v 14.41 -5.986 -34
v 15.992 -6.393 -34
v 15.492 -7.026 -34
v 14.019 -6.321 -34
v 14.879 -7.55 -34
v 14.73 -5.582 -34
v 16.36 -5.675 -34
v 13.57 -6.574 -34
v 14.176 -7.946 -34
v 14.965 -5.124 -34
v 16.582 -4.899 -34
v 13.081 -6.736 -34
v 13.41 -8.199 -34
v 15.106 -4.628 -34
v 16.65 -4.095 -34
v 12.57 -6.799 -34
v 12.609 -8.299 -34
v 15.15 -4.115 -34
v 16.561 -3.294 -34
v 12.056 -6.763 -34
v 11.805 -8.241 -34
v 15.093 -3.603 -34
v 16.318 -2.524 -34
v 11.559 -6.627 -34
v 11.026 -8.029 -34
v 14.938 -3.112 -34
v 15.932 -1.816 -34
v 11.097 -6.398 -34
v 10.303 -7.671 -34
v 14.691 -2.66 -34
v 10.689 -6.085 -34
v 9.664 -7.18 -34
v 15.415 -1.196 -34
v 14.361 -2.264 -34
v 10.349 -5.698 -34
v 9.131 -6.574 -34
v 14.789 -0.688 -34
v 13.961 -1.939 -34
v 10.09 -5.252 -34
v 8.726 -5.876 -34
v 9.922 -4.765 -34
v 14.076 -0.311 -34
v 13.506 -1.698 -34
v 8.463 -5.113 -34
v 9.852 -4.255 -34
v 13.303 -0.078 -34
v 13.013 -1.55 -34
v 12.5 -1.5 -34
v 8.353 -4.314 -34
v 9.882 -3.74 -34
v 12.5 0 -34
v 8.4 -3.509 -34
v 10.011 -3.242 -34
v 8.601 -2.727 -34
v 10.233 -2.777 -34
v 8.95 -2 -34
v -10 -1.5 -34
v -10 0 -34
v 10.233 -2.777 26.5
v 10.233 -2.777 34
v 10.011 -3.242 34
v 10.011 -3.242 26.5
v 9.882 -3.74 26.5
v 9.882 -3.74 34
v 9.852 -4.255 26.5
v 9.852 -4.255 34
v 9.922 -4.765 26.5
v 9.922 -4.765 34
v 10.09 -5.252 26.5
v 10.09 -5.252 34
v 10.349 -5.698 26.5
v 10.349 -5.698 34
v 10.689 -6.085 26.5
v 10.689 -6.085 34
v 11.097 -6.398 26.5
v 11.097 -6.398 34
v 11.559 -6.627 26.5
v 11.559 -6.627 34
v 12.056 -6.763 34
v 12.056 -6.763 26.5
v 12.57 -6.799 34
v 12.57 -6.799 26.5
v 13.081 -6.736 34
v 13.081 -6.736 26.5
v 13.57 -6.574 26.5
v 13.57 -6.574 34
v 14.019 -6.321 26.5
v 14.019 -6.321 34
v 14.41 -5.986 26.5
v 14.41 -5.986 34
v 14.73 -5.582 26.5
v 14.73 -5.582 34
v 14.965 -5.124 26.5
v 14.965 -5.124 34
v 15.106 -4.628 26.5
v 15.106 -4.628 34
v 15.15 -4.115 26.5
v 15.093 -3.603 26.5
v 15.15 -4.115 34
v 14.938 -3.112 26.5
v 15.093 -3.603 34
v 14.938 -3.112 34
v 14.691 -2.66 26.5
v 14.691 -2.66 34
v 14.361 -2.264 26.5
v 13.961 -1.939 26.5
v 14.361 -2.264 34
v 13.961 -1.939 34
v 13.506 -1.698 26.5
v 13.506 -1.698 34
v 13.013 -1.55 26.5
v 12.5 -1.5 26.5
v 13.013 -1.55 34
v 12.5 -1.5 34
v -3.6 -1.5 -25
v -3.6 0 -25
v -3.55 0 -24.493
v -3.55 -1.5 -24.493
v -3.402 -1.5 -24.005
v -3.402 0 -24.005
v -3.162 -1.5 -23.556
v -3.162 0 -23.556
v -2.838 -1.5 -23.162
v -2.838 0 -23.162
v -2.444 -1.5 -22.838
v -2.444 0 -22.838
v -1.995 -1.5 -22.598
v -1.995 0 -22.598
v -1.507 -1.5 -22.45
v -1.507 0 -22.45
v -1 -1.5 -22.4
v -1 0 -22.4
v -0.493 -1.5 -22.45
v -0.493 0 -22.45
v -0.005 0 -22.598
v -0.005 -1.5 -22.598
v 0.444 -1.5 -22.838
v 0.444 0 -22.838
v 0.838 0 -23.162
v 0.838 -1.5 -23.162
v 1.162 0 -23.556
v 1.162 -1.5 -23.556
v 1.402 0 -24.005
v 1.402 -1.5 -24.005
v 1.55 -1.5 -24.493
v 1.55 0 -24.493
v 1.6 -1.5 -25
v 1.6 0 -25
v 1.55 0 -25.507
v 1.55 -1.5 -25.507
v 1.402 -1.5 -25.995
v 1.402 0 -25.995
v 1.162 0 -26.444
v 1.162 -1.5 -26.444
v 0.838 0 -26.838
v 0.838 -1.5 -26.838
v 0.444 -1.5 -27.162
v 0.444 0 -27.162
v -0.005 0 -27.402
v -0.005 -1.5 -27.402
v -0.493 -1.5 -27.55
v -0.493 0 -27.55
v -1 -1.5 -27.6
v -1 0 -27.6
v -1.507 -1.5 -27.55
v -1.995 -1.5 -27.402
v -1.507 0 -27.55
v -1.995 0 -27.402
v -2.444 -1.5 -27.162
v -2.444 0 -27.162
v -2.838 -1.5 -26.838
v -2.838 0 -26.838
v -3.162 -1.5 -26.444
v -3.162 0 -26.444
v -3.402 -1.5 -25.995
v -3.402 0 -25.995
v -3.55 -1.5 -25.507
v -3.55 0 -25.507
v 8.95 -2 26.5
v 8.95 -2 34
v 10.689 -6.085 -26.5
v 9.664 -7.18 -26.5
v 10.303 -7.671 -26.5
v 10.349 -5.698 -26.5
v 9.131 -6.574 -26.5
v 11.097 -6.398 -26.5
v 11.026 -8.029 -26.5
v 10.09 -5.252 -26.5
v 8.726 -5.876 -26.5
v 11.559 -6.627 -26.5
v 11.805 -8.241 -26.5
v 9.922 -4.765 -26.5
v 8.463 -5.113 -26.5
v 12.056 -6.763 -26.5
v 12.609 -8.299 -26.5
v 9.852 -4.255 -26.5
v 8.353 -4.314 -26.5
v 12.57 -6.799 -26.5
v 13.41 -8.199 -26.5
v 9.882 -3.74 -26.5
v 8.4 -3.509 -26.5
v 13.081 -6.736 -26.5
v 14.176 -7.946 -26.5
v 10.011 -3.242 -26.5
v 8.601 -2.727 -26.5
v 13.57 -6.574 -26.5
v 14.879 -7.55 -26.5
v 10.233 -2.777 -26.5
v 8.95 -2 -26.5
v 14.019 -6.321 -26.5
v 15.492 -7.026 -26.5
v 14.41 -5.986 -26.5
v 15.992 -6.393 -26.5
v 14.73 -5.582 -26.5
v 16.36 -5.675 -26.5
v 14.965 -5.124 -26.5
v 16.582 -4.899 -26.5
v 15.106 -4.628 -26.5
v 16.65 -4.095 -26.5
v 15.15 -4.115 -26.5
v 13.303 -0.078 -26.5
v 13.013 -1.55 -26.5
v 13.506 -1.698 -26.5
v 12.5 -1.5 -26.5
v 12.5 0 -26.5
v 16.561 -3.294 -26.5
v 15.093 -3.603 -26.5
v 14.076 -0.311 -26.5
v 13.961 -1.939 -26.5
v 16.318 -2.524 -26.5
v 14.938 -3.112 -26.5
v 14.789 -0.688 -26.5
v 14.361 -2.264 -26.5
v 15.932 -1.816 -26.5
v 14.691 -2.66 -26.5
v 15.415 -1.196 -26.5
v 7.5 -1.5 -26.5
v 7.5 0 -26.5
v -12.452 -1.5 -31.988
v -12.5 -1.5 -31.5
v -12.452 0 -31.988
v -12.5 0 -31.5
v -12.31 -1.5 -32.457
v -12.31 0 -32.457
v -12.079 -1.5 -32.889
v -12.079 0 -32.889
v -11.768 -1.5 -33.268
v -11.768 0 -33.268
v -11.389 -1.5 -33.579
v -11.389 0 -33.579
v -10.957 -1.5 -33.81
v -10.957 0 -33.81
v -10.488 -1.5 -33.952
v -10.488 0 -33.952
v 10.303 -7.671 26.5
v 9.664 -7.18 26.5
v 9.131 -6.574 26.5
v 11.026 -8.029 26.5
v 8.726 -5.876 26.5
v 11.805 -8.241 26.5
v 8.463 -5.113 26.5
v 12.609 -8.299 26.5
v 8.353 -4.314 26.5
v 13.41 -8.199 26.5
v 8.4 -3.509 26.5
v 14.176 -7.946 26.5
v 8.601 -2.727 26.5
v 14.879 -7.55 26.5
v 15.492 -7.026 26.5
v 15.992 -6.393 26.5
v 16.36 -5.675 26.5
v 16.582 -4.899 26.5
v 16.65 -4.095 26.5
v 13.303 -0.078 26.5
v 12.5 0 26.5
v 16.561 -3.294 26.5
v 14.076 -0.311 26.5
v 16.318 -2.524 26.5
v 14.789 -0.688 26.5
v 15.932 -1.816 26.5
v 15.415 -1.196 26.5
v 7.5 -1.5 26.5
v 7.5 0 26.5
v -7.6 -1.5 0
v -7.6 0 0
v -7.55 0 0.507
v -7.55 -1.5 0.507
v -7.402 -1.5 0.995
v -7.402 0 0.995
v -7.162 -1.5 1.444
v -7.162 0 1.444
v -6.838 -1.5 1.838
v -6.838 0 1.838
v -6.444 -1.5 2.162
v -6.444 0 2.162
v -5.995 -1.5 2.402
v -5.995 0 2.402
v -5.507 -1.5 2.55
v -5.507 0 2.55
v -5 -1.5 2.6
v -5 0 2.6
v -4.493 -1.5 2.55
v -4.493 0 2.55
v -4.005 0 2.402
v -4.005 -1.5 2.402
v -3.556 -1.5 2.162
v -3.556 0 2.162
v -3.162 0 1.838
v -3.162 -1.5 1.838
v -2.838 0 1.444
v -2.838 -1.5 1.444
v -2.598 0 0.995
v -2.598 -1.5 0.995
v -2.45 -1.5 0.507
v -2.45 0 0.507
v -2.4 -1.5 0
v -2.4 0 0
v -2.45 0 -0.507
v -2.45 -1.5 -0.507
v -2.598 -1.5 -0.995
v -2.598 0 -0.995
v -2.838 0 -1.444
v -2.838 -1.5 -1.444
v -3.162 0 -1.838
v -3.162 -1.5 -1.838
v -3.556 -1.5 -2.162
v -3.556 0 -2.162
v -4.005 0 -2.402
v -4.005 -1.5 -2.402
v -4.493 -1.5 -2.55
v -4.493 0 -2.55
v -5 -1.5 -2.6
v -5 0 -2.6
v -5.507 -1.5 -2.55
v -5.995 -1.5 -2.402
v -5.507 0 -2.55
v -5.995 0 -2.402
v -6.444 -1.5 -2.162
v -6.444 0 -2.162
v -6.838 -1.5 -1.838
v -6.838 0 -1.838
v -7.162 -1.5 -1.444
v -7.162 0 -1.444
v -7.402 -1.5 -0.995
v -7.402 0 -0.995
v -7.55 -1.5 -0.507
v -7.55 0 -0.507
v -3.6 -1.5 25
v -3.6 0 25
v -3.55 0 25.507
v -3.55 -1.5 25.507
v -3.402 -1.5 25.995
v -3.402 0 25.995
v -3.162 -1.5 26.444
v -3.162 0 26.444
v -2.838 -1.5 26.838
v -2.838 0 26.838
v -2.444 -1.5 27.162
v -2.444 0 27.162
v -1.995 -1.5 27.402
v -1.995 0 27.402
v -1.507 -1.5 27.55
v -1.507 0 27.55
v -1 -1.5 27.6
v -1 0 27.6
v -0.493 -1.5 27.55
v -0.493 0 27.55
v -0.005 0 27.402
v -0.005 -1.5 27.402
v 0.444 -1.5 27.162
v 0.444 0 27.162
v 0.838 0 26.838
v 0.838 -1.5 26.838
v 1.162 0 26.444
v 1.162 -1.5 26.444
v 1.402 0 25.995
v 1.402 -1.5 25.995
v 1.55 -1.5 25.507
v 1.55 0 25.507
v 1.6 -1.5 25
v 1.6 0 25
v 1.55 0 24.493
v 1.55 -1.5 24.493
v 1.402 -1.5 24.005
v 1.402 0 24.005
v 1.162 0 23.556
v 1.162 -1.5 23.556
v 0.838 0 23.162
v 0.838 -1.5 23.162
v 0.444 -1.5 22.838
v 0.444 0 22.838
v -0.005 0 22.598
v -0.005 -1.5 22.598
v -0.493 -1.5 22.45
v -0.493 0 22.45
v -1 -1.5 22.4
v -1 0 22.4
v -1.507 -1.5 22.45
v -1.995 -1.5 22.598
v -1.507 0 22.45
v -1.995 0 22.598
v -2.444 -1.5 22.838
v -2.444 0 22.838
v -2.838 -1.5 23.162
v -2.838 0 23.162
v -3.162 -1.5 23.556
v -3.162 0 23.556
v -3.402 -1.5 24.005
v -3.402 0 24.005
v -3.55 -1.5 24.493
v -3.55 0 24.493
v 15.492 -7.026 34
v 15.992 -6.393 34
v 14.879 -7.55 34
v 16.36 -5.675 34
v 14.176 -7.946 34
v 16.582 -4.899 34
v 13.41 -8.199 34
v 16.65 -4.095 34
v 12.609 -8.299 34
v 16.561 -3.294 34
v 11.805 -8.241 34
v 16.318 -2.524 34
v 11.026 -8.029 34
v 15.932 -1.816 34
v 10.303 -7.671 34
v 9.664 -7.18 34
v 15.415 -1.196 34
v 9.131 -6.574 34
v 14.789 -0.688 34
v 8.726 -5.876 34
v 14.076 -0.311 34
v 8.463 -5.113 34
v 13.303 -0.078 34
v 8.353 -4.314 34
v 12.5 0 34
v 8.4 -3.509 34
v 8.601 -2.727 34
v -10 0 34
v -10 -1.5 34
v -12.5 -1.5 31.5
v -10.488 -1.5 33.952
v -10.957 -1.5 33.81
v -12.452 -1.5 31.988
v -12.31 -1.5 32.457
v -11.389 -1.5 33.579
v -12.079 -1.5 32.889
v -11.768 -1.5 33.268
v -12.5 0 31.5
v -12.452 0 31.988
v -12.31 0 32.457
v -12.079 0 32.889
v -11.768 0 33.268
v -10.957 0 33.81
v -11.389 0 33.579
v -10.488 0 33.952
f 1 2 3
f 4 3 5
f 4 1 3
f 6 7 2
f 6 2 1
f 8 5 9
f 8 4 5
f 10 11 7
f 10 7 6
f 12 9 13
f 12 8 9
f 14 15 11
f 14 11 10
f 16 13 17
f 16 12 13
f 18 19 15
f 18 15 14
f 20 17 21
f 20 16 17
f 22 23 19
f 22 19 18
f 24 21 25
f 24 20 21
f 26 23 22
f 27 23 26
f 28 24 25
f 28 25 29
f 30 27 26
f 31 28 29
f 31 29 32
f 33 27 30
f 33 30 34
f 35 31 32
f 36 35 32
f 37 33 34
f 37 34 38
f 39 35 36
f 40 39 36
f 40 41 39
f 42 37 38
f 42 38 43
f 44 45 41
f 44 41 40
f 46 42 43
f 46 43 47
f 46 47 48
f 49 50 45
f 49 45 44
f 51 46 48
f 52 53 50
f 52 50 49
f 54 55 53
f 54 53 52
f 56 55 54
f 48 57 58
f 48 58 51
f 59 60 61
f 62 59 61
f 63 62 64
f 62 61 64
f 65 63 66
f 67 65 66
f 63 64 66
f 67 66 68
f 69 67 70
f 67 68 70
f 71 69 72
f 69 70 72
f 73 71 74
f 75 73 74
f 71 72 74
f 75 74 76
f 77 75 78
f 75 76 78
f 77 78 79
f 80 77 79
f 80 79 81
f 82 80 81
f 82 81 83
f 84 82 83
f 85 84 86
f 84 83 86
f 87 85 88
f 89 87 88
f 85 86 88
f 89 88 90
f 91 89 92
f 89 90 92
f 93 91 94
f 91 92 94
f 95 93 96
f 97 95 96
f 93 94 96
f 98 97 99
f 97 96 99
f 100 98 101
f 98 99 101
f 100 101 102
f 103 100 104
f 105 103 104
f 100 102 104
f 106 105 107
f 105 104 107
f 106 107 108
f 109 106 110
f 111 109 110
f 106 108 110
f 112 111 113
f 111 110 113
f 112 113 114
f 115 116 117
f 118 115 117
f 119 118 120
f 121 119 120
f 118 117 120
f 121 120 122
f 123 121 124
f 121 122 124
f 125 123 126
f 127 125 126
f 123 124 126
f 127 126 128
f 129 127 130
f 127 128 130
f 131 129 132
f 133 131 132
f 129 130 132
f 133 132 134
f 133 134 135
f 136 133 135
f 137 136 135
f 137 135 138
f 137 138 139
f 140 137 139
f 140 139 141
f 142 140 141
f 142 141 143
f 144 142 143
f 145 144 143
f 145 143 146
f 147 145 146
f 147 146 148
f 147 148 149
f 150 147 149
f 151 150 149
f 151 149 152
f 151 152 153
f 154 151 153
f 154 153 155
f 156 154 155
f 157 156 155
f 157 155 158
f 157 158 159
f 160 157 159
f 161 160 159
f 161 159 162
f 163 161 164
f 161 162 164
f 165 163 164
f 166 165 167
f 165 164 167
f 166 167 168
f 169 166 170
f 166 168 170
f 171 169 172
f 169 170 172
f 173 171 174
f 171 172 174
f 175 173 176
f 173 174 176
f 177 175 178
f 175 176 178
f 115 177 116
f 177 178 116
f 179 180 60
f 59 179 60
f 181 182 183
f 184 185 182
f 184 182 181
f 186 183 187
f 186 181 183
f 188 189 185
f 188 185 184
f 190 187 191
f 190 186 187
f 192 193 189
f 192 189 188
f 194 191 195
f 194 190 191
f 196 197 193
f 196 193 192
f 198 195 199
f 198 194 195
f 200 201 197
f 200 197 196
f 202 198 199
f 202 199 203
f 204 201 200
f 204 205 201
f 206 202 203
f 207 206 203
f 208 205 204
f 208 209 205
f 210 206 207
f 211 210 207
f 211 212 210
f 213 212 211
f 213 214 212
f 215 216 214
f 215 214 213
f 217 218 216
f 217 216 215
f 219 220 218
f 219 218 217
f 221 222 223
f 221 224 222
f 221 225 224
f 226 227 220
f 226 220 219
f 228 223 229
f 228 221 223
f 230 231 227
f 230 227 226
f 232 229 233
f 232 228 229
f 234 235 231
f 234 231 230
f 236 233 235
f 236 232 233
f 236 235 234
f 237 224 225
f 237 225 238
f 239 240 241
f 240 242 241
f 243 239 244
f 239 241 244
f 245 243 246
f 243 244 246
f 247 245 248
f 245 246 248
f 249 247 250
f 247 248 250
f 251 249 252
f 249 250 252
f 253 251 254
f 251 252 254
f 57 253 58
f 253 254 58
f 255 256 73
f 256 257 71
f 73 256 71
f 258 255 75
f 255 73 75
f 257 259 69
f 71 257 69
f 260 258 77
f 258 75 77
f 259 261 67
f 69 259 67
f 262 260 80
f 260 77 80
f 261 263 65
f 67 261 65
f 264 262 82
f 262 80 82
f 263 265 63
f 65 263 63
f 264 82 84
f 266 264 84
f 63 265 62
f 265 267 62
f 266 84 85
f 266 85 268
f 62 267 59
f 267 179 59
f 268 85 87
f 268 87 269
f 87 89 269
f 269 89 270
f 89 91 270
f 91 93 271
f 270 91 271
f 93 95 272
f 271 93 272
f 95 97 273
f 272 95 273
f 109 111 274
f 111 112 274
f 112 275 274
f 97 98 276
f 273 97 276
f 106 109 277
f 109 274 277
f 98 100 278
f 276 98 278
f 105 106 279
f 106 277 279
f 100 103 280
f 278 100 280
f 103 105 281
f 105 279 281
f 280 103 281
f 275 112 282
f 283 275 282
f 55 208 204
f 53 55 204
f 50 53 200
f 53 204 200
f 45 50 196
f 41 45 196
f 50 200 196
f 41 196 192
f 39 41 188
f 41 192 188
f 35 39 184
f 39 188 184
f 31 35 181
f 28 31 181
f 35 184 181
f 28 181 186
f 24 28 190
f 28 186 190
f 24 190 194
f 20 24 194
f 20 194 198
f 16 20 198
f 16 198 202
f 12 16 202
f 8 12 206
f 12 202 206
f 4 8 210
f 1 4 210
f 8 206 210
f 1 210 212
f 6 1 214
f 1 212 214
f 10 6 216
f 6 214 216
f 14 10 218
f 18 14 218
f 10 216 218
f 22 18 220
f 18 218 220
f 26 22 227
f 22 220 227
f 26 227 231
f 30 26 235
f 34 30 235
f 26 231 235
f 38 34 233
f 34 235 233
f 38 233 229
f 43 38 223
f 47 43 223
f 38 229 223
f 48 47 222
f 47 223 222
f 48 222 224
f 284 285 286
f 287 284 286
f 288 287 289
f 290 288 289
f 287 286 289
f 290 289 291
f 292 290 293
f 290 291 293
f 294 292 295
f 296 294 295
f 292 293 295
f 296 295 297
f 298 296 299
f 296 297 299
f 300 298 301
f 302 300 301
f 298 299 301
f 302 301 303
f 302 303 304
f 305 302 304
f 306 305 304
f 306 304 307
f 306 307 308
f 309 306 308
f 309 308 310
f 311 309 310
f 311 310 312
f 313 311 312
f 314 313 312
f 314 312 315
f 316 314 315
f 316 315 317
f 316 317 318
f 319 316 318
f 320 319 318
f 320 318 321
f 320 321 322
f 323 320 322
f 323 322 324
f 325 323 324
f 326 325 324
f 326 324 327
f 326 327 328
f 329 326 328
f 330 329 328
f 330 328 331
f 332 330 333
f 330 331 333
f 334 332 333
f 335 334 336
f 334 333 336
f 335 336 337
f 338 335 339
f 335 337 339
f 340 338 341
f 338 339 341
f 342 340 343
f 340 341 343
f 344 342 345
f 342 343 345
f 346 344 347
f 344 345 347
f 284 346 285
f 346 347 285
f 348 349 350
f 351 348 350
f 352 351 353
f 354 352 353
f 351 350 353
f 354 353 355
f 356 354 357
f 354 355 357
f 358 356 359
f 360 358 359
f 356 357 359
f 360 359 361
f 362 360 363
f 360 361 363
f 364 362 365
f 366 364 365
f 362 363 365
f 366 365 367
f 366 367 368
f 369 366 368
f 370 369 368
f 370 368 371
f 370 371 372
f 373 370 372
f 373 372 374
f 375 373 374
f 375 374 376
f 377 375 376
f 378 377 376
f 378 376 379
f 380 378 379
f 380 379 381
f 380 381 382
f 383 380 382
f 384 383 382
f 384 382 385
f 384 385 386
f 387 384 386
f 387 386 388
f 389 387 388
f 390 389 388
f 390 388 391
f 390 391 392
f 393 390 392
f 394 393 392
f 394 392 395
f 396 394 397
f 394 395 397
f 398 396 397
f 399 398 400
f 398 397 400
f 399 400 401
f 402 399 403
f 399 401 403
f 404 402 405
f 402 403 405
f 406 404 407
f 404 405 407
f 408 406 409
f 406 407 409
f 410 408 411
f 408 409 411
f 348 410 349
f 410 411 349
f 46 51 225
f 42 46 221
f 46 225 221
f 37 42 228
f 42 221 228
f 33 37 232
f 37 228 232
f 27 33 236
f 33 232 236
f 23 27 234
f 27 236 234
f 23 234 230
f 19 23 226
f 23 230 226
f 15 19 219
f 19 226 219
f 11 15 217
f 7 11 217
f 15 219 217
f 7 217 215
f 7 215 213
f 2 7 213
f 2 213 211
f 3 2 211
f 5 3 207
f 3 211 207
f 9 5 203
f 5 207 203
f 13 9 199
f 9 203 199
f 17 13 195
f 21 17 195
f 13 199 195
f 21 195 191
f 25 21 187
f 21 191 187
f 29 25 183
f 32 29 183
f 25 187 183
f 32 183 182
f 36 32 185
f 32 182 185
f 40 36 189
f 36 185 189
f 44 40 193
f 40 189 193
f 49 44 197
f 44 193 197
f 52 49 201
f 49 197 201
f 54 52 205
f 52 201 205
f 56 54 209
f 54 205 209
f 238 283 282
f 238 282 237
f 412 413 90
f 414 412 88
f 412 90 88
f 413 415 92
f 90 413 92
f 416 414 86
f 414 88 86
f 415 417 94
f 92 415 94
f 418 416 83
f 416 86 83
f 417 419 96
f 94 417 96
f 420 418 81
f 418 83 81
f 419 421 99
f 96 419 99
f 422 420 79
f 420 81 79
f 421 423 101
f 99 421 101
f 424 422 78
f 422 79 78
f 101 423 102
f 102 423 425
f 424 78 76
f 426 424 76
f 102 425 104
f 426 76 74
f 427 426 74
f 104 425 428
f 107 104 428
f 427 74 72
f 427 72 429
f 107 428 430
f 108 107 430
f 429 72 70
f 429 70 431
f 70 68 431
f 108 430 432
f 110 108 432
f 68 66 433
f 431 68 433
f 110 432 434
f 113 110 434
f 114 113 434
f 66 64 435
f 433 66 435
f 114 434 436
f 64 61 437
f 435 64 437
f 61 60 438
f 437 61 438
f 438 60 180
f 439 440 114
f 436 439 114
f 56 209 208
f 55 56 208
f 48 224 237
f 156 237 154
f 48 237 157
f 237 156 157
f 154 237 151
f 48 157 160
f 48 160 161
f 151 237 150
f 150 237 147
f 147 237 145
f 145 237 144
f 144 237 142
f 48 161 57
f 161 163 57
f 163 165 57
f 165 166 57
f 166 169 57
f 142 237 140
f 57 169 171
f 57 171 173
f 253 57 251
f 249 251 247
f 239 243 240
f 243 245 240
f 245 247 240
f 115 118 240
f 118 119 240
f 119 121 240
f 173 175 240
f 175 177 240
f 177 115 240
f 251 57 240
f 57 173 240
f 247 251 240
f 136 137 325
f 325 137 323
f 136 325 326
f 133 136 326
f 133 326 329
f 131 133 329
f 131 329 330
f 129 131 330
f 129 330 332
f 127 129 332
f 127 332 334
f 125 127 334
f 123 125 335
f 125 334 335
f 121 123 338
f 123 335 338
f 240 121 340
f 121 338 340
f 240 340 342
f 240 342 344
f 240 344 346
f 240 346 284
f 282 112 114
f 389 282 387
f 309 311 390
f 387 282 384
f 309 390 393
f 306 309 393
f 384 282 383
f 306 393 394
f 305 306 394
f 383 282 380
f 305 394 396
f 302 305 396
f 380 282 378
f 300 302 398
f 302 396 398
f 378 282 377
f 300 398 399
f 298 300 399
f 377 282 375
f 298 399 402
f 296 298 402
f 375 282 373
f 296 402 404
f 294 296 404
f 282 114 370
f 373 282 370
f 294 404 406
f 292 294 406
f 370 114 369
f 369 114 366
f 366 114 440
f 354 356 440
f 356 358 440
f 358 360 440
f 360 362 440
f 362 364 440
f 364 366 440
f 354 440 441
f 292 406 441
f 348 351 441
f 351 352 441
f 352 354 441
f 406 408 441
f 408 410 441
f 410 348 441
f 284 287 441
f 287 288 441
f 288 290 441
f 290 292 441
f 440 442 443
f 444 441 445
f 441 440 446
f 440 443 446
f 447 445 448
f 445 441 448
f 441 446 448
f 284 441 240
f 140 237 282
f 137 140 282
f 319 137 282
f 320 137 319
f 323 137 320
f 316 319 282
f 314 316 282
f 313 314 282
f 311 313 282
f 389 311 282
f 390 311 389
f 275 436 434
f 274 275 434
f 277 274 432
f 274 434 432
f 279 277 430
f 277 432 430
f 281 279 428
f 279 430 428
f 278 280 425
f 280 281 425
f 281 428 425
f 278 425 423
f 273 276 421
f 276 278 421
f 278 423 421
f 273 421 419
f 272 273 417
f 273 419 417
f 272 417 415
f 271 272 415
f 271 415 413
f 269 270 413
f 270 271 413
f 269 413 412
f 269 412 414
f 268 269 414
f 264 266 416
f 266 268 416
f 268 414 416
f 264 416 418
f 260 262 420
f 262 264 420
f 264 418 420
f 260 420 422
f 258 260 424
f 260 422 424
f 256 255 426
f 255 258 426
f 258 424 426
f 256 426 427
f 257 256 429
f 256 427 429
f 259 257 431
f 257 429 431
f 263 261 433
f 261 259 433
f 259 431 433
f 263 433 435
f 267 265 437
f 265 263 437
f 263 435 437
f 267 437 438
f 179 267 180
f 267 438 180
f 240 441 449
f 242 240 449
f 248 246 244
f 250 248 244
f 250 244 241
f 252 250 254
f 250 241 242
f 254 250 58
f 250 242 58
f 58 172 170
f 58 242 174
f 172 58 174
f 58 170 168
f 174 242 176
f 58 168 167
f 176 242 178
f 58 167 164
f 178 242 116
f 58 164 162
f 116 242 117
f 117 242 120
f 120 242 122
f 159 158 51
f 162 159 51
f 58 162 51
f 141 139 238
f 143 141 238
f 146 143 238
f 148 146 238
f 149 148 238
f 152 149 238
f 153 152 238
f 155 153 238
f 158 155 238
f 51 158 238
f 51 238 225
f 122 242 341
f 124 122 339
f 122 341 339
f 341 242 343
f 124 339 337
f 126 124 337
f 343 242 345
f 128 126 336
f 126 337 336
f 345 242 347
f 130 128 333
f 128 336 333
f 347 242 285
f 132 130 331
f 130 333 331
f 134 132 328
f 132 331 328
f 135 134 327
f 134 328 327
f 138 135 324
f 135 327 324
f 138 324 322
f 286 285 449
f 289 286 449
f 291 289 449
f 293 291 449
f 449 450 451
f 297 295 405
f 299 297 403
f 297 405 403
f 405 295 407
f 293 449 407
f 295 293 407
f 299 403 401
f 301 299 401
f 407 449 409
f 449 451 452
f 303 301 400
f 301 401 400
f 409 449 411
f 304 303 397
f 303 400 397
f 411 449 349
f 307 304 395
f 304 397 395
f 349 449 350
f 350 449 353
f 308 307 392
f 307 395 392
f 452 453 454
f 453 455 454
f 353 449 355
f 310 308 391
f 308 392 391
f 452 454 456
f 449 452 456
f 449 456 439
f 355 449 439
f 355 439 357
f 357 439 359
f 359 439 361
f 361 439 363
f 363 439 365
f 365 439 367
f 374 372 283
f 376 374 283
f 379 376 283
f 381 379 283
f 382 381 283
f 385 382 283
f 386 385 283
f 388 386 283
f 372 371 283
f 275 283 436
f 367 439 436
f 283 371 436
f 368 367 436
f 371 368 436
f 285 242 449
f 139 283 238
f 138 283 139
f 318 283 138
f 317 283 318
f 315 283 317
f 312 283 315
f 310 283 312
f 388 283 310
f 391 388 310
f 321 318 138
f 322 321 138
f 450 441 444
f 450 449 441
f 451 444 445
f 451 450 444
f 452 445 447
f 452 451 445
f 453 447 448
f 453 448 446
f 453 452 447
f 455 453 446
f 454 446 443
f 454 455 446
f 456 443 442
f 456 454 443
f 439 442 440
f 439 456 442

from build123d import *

# Parameters (mm, degrees)
TABAN_FLAN_1_DEPTH    = 34
IZIM9_W               = 9.15
IZIM9_H               = 53
KES_EKSTR_ZYON1_DEPTH = 39.757096124
IZIM11_R              = 2.6
KES_EKSTR_ZYON2_DEPTH = 10
RADYUS1_R             = 2.5


# Sheet-metal steps are written as plain solids
with BuildPart() as part:
    # Çizim1 → Taban-Flanş1 (new, symmetric)
    with BuildSketch(Plane.XY):
        with BuildLine():
            Line((-12.5, 0), (12.5, 0))
            ThreePointArc((12.5, 0), (14.537154879, -7.765591238), (8.95035213, -2))
            Line((8.95035213, -2), (10.233357384, -2.777108434))
            ThreePointArc((10.233357384, -2.777108434), (13.800833838, -6.458751031), (12.5, -1.5))
            Line((12.5, -1.5), (-12.5, -1.5))
            Line((-12.5, -1.5), (-12.5, 0))
        make_face()
    extrude(amount=TABAN_FLAN_1_DEPTH, both=True)

    # Çizim9 → Kes-Ekstrüzyon1 (cut, through all)
    with BuildSketch(Plane(origin=(0, 0, 0), x_dir=(1, 0, 0), z_dir=(0, 1, 0))):
        with Locations((12.075, 0)):
            Rectangle(IZIM9_W, IZIM9_H)
    extrude(amount=-KES_EKSTR_ZYON1_DEPTH, mode=Mode.SUBTRACT)

    # Çizim11 → Kes-Ekstrüzyon2 (cut)
    with BuildSketch(Plane(origin=(0, 0, 0), x_dir=(1, 0, 0), z_dir=(0, 1, 0))):
        with Locations(Location((-1, 25, 0), (0, 0, 180))):
            Circle(IZIM11_R)
        with Locations(Location((-1, -25, 0), (0, 0, 180))):
            Circle(IZIM11_R)
        with Locations(Location((-5, 0, 0), (0, 0, 180))):
            Circle(IZIM11_R)
    extrude(amount=-KES_EKSTR_ZYON2_DEPTH, mode=Mode.SUBTRACT)

    # Radyus1
    radyus1_edges = [part.edges().sort_by_distance(p)[0] for p in [
        (-12.5, -0.75, 34),
        (-12.5, -0.75, -34),
    ]]
    fillet(radyus1_edges, radius=RADYUS1_R)


solid = part.part
